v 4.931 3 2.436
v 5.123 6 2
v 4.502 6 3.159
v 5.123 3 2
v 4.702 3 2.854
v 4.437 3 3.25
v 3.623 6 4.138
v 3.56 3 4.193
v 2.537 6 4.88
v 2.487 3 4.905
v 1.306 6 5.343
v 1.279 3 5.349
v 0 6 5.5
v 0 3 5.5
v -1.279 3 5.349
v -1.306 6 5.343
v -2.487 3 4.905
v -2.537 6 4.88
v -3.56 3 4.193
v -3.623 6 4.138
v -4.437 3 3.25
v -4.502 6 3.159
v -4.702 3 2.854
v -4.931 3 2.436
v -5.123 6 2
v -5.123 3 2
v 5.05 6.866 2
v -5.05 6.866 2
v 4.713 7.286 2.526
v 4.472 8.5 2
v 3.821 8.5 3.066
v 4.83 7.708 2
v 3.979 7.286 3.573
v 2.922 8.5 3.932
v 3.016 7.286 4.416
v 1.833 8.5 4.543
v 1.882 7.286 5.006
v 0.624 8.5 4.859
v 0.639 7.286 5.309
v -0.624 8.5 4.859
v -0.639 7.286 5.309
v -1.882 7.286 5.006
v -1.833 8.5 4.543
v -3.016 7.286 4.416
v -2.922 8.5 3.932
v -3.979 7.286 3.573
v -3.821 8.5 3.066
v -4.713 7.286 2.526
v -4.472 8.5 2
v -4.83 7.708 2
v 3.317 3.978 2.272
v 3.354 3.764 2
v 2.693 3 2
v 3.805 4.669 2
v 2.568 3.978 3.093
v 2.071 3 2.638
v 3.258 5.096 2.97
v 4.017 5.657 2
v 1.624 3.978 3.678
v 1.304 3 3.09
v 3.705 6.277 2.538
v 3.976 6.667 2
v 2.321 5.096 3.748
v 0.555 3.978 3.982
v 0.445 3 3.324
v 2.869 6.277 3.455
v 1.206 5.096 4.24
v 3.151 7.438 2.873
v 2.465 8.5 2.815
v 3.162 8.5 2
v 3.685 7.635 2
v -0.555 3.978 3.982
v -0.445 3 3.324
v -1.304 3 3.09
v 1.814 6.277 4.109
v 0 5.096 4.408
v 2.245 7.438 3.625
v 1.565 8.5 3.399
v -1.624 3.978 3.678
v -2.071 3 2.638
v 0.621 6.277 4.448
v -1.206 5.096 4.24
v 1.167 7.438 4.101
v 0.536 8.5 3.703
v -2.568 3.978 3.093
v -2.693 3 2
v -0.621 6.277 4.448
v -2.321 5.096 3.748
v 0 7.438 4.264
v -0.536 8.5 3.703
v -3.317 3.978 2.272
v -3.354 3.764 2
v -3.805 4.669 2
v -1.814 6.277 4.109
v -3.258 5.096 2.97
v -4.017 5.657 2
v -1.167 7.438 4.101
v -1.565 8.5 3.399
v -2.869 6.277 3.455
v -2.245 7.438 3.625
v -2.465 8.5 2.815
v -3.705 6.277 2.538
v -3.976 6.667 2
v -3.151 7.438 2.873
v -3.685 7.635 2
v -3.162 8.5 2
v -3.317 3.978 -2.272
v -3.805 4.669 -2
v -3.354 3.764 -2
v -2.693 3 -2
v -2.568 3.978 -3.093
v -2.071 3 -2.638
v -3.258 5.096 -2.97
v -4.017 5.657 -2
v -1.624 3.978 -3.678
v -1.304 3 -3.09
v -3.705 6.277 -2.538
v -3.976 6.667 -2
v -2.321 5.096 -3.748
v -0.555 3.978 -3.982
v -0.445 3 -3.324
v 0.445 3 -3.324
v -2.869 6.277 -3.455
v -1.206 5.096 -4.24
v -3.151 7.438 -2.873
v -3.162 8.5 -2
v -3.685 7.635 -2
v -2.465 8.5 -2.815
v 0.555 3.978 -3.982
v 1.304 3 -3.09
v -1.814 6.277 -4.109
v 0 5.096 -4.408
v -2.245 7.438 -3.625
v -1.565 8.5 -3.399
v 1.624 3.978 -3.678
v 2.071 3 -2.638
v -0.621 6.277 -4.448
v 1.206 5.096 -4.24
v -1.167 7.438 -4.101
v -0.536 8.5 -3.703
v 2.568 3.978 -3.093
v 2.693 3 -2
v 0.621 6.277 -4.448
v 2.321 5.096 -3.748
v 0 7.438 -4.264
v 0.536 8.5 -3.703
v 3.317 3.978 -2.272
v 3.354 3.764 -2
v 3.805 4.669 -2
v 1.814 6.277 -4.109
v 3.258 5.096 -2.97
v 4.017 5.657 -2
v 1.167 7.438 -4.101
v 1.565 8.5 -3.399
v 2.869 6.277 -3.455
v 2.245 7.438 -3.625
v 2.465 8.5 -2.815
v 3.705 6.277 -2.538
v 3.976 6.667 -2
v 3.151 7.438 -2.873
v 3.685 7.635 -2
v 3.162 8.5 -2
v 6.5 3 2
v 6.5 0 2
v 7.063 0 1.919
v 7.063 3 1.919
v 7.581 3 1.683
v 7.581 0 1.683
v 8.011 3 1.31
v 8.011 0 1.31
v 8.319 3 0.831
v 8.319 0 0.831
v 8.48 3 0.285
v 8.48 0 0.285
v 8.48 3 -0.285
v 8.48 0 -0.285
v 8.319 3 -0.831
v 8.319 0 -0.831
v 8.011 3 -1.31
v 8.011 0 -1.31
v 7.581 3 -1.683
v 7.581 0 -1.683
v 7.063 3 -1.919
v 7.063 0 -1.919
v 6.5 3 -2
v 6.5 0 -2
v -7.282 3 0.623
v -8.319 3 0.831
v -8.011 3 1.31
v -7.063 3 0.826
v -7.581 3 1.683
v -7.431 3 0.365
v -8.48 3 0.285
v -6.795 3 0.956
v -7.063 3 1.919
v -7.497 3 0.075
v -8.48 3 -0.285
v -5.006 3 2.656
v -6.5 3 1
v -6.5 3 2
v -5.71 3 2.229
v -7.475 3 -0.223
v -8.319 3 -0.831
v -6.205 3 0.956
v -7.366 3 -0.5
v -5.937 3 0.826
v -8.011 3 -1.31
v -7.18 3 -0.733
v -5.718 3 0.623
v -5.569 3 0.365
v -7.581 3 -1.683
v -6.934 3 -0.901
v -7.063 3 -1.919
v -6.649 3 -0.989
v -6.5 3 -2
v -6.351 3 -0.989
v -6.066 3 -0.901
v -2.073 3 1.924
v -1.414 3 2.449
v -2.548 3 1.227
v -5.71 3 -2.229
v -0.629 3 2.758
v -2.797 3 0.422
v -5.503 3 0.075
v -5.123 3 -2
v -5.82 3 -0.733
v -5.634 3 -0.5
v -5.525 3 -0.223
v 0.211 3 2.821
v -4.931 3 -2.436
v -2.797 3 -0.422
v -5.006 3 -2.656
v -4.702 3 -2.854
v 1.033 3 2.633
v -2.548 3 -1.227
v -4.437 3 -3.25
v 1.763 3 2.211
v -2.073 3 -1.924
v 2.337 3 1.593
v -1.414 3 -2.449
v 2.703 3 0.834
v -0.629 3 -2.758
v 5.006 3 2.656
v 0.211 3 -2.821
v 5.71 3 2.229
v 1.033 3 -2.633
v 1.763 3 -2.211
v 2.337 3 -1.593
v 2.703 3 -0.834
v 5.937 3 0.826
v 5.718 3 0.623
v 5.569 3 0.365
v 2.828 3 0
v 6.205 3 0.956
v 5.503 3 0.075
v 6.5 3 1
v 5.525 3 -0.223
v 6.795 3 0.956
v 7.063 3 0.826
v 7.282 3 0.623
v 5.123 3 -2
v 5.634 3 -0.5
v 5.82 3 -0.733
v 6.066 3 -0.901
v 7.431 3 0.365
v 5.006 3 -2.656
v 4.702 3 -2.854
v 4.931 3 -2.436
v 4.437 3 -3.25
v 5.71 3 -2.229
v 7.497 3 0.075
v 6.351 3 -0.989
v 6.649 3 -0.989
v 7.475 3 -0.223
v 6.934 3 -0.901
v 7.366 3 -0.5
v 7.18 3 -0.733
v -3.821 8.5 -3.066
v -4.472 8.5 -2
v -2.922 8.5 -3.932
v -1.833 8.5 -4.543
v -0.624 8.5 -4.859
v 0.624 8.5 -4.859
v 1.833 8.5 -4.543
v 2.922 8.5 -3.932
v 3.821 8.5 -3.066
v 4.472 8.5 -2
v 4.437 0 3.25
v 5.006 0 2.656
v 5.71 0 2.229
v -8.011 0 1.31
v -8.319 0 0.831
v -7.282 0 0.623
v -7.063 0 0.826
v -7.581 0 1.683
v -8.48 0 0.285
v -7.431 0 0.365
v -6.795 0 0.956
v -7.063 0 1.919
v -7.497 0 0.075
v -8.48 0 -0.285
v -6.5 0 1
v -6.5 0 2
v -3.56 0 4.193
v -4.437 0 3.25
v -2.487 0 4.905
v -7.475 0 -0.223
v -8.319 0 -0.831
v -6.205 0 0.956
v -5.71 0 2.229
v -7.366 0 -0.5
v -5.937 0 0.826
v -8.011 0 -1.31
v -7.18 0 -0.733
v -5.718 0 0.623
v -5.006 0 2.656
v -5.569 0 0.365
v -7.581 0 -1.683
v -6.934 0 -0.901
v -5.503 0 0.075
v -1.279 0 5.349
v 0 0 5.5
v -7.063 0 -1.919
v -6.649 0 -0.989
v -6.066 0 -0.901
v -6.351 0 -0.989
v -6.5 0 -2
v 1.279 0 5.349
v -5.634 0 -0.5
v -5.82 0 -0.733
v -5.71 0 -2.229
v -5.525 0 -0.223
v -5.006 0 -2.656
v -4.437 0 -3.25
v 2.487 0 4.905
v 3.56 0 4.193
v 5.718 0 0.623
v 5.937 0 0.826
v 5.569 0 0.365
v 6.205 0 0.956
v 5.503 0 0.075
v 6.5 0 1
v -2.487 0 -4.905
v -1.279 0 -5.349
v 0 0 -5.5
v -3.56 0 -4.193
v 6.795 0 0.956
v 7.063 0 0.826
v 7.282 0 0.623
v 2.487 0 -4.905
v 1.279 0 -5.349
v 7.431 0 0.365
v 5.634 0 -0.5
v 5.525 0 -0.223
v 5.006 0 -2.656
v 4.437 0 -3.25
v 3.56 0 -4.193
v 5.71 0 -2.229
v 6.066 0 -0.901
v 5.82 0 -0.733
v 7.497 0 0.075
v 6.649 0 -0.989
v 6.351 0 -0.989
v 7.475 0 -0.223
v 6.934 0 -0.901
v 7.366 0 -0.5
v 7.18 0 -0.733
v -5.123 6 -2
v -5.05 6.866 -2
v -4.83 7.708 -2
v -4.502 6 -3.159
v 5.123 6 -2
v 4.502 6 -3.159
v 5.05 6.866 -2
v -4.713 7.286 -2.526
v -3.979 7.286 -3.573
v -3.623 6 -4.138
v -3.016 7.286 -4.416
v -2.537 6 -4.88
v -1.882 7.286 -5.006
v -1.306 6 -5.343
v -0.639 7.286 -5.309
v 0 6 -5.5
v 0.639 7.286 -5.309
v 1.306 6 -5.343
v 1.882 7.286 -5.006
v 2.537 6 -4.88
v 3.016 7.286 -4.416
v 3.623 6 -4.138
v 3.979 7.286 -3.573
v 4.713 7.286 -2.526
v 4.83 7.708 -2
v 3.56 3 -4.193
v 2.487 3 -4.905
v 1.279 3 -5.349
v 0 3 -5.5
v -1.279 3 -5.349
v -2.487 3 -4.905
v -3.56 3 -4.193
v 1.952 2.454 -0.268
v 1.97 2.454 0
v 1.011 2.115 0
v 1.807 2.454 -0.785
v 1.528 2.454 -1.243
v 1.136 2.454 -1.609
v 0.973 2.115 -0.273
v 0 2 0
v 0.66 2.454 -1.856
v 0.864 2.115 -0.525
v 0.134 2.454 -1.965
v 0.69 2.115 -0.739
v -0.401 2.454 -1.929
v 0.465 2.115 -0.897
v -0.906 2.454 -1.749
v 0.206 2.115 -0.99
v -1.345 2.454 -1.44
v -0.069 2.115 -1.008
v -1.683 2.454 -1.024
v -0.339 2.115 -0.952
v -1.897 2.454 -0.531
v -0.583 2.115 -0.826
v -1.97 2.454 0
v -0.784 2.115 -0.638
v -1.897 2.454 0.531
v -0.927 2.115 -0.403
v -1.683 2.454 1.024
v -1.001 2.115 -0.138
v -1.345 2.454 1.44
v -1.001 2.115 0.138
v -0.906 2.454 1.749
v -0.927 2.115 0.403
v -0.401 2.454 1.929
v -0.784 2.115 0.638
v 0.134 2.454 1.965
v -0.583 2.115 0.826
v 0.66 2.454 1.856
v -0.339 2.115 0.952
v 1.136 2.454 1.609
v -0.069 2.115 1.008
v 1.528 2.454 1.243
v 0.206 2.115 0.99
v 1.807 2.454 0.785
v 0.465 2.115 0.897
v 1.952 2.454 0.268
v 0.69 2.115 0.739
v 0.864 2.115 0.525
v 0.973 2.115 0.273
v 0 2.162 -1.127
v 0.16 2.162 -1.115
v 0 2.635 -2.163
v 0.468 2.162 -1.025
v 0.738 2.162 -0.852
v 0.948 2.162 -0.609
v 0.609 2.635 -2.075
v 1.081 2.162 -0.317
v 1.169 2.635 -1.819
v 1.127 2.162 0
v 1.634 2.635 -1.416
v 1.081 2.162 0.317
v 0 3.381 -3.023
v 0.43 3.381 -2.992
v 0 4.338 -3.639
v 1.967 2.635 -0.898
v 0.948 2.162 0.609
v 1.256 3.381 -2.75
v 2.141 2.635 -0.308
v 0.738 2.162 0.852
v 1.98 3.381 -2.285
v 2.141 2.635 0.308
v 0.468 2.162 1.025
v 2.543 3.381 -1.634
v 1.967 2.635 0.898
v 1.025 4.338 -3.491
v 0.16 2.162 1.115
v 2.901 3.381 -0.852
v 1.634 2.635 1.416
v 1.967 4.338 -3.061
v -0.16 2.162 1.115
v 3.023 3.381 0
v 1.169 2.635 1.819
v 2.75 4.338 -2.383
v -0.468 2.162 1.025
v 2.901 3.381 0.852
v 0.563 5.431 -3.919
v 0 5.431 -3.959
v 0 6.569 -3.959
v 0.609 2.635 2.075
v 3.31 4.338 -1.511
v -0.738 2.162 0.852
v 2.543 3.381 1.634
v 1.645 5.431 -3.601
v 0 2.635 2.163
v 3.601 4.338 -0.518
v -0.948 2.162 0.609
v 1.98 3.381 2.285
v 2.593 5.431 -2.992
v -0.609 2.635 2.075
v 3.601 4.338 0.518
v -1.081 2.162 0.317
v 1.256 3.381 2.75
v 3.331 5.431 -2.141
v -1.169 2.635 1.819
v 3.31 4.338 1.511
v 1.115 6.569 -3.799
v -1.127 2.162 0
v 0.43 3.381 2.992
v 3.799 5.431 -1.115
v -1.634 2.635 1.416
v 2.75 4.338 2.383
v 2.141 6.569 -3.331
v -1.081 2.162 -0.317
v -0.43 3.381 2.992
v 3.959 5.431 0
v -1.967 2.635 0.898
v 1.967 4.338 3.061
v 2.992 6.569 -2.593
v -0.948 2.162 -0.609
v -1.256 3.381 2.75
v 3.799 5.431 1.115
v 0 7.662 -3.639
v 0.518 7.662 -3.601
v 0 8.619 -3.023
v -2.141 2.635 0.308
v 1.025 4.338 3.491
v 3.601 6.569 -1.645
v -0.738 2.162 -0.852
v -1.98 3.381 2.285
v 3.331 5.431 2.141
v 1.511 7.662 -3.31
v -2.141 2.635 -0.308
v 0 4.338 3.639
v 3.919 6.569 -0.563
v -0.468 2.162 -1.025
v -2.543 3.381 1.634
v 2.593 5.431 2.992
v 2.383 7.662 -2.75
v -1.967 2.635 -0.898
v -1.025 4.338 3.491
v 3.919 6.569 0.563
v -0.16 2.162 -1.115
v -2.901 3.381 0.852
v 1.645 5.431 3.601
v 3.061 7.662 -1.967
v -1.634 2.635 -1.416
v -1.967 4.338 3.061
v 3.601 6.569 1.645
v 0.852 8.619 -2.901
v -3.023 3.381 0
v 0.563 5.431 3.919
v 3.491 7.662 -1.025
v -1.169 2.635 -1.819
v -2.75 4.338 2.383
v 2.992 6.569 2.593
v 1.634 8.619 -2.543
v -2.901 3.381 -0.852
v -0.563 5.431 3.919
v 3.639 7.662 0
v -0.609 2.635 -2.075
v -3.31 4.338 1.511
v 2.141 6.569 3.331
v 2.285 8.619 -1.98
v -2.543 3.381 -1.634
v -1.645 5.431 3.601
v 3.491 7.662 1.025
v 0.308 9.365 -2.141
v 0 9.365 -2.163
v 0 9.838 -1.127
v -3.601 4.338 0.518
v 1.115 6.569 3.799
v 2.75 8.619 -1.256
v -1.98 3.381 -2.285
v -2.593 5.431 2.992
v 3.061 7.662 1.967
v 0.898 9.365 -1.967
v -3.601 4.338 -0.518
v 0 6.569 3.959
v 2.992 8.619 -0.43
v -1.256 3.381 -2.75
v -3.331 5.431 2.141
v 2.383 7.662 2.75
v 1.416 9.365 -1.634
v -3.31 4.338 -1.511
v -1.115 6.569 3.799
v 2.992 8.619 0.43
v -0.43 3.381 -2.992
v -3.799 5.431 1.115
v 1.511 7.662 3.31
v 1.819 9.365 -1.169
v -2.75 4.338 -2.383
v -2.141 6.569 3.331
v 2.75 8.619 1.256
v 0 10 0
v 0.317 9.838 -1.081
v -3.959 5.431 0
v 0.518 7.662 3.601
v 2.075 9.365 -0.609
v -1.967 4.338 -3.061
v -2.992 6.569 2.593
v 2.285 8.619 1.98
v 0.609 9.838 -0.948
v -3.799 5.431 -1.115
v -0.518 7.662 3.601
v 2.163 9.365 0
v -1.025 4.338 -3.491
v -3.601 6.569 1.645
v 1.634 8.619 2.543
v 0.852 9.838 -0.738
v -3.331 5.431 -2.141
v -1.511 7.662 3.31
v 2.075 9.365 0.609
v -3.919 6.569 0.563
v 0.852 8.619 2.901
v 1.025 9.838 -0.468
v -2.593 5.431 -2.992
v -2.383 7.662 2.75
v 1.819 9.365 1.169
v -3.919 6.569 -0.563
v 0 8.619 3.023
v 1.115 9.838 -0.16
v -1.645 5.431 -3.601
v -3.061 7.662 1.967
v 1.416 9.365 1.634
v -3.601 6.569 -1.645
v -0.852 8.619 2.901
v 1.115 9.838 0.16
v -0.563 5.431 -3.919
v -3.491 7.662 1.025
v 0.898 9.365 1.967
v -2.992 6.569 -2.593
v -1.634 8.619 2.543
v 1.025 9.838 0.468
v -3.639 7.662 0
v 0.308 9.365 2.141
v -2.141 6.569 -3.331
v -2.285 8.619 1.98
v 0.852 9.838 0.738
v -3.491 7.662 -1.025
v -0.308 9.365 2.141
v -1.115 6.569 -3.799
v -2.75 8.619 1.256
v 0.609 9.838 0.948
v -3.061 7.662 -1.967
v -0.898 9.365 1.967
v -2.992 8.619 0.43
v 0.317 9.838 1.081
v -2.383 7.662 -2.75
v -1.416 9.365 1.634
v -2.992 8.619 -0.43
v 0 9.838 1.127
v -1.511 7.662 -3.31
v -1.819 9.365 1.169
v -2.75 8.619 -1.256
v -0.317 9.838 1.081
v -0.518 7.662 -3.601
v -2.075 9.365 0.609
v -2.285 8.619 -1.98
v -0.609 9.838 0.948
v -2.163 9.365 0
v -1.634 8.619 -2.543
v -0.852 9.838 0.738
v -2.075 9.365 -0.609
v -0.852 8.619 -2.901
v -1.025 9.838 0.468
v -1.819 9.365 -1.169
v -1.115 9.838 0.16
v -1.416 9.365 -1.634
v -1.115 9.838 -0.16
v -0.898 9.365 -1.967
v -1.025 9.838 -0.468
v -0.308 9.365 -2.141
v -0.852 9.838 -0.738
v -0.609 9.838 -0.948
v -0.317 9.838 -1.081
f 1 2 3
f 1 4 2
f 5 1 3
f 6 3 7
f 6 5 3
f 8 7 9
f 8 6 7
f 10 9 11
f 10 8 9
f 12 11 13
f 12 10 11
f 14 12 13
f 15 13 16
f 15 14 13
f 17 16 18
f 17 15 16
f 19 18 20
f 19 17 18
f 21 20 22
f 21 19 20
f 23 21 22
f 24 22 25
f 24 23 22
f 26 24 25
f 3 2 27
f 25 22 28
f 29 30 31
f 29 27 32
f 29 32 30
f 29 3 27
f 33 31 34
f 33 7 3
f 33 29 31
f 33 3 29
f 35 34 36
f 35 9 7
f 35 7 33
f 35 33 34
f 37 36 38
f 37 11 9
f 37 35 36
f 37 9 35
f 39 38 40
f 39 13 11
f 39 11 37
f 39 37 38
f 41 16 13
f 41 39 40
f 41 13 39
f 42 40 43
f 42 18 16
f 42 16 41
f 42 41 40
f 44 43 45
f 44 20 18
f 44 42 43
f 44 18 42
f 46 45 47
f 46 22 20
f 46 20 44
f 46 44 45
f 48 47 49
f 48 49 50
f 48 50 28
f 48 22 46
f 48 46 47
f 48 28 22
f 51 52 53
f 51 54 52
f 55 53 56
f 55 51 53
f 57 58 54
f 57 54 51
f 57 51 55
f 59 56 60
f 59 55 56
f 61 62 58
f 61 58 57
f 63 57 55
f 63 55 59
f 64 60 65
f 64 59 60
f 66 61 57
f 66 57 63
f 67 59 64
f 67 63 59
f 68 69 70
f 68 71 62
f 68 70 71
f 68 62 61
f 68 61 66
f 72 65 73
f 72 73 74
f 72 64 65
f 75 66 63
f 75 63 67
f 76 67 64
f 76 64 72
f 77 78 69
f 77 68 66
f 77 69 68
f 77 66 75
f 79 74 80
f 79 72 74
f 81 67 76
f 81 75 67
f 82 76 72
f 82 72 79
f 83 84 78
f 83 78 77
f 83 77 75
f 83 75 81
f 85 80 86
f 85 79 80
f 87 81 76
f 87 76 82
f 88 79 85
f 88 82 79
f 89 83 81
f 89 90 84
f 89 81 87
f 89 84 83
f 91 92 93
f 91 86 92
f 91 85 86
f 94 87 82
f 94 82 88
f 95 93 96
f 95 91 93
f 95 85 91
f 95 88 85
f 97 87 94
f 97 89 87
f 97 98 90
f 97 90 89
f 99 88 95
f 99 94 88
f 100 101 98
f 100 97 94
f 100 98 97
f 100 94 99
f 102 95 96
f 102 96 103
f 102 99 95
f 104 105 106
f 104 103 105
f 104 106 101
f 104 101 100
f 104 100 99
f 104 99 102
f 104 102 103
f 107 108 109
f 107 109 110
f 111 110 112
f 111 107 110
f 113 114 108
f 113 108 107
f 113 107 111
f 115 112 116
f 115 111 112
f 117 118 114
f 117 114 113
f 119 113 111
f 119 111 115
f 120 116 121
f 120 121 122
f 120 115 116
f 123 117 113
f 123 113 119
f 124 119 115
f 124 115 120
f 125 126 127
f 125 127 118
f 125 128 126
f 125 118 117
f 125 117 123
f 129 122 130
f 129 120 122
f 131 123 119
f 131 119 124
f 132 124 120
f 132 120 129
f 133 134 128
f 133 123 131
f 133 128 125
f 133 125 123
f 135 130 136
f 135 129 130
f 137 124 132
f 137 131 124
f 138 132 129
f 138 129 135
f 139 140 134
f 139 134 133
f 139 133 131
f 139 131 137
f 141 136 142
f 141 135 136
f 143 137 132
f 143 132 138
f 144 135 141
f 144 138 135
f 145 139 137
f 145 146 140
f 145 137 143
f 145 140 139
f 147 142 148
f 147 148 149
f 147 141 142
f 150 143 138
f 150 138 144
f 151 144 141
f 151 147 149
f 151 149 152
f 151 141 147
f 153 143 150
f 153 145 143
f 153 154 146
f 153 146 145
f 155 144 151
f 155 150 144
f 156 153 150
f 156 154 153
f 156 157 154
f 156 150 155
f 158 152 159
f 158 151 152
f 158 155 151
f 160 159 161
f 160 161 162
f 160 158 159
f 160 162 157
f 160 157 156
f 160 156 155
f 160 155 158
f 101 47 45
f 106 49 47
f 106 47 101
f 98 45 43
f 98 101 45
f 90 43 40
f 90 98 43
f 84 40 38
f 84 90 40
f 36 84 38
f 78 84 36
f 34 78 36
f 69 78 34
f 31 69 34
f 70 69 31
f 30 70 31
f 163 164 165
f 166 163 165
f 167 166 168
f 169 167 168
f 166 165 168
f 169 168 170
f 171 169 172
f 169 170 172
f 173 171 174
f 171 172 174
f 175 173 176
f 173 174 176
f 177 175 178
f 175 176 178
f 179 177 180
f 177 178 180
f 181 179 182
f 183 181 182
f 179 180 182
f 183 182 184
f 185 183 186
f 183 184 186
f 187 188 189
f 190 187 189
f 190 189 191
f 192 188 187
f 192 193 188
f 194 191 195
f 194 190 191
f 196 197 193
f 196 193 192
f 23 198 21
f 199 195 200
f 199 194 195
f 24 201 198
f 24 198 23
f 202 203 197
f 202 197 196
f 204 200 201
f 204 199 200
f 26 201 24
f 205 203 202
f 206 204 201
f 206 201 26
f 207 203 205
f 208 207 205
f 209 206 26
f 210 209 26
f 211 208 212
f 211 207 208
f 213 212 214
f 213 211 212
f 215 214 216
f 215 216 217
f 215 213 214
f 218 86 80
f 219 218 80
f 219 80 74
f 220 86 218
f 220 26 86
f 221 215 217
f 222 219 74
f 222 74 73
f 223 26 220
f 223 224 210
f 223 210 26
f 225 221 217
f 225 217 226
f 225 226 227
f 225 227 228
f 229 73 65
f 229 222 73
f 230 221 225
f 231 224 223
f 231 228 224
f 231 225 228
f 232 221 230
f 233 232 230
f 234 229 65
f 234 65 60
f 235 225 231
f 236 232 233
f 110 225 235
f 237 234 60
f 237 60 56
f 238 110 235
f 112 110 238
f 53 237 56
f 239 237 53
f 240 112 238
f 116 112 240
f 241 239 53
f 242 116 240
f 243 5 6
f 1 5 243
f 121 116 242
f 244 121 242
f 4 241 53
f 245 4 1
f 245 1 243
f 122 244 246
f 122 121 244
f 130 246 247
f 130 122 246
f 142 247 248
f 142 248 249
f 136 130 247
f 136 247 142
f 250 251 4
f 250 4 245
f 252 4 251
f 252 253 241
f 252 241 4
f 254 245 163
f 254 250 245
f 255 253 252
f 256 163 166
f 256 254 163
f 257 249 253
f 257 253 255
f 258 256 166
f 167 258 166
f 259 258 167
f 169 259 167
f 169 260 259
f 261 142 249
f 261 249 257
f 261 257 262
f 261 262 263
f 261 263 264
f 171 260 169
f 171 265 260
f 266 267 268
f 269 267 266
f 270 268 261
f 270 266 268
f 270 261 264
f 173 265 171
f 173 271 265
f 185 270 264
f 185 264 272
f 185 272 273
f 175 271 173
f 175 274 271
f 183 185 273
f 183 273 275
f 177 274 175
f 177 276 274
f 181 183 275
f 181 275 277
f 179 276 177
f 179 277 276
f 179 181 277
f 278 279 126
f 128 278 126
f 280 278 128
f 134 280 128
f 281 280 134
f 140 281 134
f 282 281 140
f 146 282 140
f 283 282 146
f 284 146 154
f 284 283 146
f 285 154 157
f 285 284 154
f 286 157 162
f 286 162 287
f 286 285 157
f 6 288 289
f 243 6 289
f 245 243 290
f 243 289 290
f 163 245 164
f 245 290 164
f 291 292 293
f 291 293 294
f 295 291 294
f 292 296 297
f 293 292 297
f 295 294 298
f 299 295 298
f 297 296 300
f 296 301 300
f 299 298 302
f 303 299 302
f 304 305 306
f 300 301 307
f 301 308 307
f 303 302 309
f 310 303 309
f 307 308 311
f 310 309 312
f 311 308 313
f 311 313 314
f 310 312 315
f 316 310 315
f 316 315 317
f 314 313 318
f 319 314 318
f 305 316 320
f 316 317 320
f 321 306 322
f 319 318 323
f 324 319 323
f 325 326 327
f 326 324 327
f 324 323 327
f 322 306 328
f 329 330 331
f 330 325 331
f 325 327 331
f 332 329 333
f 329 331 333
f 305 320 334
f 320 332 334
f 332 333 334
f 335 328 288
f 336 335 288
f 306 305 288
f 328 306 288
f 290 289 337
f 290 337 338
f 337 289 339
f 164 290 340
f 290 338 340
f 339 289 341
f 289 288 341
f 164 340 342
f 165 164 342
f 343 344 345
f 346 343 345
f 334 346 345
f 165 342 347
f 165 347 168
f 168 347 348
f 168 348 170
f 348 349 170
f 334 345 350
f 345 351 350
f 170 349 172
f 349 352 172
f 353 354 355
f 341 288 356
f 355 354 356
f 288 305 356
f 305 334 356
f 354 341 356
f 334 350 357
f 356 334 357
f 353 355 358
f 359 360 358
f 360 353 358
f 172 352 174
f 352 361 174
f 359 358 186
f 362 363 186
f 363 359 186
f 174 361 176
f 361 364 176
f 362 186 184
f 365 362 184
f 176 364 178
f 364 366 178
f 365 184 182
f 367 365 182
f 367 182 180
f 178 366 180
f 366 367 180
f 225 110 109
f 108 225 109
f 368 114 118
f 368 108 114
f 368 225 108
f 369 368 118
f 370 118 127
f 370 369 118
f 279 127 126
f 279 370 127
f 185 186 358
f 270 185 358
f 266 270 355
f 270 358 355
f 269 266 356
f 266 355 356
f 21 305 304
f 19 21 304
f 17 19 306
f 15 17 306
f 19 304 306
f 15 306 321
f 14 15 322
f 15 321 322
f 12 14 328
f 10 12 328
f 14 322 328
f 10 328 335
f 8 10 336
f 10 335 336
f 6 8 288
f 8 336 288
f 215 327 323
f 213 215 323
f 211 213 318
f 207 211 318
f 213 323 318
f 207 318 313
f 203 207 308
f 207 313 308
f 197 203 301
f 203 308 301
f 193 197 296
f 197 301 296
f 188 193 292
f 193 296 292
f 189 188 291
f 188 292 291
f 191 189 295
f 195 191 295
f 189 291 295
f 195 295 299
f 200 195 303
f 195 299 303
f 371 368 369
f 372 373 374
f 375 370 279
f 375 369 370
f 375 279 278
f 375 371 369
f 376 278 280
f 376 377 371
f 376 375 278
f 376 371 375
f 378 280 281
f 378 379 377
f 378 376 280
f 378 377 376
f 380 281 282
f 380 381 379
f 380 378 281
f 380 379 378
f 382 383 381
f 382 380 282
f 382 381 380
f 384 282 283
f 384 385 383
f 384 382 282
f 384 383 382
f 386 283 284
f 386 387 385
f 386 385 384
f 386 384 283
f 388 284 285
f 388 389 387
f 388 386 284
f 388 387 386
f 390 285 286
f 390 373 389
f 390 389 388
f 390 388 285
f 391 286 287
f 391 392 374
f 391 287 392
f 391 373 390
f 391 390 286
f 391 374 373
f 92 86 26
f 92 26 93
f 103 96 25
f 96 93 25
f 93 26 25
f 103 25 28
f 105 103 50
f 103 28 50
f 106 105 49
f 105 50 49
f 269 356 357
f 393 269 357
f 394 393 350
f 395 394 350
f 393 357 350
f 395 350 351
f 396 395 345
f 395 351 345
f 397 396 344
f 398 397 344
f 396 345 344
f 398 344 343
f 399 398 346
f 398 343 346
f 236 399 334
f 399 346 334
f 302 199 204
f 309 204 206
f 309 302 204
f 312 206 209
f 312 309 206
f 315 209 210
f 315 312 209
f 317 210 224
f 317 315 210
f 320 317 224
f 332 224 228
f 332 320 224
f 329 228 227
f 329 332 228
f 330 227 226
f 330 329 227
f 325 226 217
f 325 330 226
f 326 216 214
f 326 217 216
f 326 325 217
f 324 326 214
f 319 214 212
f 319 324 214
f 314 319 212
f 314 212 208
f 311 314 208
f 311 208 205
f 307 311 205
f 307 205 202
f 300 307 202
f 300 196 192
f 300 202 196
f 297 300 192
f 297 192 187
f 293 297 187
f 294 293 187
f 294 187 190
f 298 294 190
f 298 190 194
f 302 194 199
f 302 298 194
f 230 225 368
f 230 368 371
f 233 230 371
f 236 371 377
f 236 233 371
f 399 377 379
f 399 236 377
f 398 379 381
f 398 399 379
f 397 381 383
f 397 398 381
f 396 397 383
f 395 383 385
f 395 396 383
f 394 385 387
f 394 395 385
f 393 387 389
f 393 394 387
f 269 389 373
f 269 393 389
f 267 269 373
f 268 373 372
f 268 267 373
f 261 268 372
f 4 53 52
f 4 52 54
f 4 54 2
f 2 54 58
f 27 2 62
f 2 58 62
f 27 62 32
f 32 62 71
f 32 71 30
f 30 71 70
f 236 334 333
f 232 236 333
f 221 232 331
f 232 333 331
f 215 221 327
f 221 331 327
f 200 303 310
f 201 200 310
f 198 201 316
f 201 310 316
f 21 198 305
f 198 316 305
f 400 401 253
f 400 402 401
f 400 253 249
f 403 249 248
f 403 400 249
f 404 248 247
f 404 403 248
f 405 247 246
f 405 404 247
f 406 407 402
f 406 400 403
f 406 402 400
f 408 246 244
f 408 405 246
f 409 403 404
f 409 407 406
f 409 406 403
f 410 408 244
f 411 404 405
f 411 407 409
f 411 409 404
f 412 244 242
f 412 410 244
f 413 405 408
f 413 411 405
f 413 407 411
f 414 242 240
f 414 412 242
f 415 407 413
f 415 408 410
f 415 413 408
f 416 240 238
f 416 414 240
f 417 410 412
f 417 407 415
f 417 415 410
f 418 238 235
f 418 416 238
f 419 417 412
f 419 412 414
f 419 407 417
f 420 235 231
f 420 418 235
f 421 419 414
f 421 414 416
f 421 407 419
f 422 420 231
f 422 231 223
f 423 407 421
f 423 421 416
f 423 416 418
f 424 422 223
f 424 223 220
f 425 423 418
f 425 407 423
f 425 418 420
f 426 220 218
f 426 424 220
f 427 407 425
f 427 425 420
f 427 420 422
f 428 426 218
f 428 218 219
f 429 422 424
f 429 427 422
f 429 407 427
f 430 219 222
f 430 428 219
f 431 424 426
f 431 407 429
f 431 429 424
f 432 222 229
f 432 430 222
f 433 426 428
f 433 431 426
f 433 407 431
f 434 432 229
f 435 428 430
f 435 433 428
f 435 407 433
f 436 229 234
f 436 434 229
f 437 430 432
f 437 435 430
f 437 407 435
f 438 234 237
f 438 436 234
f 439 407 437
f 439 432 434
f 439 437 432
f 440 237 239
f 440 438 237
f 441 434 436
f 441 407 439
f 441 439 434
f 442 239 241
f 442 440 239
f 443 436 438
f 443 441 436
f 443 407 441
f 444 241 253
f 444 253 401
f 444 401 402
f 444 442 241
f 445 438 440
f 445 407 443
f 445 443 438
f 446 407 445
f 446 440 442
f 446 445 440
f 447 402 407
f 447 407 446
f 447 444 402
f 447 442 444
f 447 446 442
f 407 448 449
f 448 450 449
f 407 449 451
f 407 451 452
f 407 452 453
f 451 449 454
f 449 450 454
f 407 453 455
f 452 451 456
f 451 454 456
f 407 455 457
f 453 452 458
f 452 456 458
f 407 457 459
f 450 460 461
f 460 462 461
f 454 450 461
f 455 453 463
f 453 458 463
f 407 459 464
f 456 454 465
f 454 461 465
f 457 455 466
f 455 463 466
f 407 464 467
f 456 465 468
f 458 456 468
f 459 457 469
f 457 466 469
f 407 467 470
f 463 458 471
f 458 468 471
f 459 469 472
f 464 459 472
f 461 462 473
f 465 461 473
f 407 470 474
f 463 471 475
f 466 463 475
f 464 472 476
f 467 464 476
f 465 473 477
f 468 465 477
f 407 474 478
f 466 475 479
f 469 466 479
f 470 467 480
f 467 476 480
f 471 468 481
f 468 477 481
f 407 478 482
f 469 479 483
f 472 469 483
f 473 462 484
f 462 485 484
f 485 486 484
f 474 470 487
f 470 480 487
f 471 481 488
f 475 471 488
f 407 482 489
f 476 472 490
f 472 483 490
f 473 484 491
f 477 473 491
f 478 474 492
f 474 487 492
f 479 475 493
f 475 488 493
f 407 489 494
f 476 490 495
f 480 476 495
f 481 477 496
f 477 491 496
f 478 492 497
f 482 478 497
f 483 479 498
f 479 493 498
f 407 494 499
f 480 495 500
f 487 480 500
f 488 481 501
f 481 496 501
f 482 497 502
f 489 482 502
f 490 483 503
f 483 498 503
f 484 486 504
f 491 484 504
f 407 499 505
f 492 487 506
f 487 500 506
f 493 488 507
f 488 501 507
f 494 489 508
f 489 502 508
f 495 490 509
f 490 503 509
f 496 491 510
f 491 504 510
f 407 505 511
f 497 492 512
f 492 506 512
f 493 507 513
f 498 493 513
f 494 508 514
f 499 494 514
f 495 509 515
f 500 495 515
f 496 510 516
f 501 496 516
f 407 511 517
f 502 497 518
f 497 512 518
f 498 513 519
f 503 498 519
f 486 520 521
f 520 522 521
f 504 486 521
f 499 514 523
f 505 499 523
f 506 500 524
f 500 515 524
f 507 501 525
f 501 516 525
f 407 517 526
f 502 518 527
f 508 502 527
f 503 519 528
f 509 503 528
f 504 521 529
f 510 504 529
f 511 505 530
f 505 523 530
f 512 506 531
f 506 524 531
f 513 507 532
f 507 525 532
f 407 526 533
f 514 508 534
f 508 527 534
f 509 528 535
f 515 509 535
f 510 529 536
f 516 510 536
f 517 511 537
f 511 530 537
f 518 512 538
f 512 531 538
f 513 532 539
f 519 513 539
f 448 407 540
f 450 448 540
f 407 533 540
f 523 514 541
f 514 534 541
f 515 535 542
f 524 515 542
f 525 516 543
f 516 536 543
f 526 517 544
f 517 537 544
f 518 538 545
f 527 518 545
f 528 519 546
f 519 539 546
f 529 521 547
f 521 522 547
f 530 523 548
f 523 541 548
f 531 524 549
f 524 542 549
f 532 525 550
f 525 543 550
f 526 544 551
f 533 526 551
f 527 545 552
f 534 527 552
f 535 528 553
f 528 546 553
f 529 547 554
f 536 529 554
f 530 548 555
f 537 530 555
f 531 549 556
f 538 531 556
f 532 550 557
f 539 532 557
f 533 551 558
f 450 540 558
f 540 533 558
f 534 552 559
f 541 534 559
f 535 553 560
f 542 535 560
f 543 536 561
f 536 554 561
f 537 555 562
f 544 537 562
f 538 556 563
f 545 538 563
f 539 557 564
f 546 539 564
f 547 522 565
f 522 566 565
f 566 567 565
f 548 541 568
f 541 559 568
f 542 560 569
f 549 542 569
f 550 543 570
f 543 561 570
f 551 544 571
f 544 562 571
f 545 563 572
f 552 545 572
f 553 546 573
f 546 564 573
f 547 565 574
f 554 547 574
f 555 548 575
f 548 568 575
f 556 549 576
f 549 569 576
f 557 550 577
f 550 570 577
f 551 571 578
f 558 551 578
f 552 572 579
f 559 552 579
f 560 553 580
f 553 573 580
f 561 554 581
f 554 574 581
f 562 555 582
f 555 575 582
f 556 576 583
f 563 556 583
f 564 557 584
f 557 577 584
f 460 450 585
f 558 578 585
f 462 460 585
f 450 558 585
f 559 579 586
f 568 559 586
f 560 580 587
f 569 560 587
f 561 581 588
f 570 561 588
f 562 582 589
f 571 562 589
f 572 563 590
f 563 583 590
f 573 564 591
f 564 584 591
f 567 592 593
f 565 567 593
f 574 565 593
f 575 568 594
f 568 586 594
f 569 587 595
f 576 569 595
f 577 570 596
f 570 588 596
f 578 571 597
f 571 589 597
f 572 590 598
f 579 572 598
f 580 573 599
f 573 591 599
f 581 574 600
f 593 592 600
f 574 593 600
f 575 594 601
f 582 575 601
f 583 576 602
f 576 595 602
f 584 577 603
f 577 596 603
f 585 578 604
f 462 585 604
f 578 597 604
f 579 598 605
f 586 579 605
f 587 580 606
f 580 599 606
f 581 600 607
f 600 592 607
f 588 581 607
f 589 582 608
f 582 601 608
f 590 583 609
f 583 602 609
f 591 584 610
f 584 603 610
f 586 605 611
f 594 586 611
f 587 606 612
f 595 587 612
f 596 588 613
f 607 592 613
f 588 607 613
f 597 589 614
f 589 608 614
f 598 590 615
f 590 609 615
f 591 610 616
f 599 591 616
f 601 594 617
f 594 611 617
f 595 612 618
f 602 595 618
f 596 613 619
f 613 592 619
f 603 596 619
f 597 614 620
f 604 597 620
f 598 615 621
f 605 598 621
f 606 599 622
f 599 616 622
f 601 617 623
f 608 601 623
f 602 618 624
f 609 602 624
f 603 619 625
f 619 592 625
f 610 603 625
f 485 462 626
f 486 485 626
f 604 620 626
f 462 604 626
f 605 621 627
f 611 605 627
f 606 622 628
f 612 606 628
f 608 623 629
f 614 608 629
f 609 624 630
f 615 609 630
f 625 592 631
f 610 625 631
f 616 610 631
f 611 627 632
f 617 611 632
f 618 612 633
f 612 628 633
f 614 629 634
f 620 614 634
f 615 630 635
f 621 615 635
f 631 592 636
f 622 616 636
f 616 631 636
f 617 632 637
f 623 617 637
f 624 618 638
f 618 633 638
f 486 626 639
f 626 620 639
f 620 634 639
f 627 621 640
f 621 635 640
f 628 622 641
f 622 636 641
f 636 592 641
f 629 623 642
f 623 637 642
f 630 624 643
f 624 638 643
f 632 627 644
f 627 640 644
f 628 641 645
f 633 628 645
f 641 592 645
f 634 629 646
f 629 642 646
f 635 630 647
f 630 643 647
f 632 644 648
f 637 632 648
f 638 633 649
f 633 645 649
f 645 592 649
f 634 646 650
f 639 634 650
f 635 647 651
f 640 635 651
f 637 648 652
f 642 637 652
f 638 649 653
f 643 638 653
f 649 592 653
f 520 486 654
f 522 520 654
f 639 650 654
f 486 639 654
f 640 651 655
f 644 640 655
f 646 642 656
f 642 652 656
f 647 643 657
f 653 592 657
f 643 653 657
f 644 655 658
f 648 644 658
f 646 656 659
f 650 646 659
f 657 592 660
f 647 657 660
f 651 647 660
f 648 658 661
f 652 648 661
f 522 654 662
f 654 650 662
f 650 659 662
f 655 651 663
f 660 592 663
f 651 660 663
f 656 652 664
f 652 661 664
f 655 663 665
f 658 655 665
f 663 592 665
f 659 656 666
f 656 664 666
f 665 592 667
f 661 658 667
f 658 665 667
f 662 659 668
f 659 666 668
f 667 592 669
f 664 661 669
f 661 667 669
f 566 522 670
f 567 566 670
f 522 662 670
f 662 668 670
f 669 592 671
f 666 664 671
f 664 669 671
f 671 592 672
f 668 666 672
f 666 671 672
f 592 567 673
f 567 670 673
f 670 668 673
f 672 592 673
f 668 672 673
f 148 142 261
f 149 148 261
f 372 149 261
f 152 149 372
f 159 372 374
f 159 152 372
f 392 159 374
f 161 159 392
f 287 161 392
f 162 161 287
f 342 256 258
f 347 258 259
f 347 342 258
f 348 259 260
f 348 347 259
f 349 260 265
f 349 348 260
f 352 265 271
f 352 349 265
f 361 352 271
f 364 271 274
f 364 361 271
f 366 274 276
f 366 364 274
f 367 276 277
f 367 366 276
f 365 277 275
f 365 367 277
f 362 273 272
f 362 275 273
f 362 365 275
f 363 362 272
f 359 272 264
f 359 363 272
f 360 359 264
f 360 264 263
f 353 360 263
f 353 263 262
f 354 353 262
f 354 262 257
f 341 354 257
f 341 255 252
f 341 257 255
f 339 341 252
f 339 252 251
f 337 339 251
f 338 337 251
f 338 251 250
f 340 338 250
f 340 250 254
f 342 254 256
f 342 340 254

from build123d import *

# Parameters (mm, degrees)
SKETCH1_R               = 1
BOSS_EXTRUDE1_DEPTH     = 3
CUT_EXTRUDE2_DEPTH      = 14.219304066
CUT_EXTRUDE2_DEPTH_BACK = 14.219304066
SKETCH20_W              = 4
SKETCH20_H              = 5.5


with BuildPart() as part:
    # Sketch1 → Boss-Extrude1 (new body)
    with BuildSketch(Plane(origin=(0, 0, 0), x_dir=(1, 0, 0), z_dir=(0, 1, 0))):
        with BuildLine():
            ThreePointArc((-4.437059837, -3.25), (0, -5.5), (4.437059837, -3.25))
            ThreePointArc((4.437059837, -3.25), (5.343838437, -2.419215147), (6.5, -2))
            ThreePointArc((6.5, -2), (8.5, 0), (6.5, 2))
            ThreePointArc((6.5, 2), (5.343838437, 2.419215147), (4.437059837, 3.25))
            ThreePointArc((4.437059837, 3.25), (0, 5.5), (-4.437059837, 3.25))
            ThreePointArc((-4.437059837, 3.25), (-5.343838437, 2.419215147), (-6.5, 2))
            ThreePointArc((-6.5, 2), (-8.5, 0), (-6.5, -2))
            ThreePointArc((-6.5, -2), (-5.343838437, -2.419215147), (-4.437059837, -3.25))
        make_face()
        with Locations(Location((-6.5, 0, 0), (0, 0, 270))):
            Circle(SKETCH1_R, mode=Mode.SUBTRACT)
        with Locations(Location((6.5, 0, 0), (0, 0, 270))):
            Circle(SKETCH1_R, mode=Mode.SUBTRACT)
    extrude(amount=BOSS_EXTRUDE1_DEPTH)

    # Sketch10 → Cut-Revolve2 (revolve, cut)
    with BuildSketch(Plane.XY):
        with BuildLine():
            Line((0, 2), (0, 11))
            ThreePointArc((0, 11), (4.5, 6.5), (0, 2))
        make_face()
    revolve(axis=Axis((0, 2, 0), (0, 1, 0)), mode=Mode.SUBTRACT)

    # Sketch19 → Revolve6 (revolve)
    with BuildSketch(Plane(origin=(0, 0, 0), x_dir=(0, 0, -1), z_dir=(1, 0, 0)), mode=Mode.PRIVATE) as revolve6_sk:
        with BuildLine():
            Line((5.5, 6), (5.5, 3))
            Line((5.5, 3), (3.354101966, 3))
            ThreePointArc((3.354101966, 3), (4.48886959, 5.683693501), (3.741657387, 8.5))
            Line((3.741657387, 8.5), (4.898979486, 8.5))
            ThreePointArc((4.898979486, 8.5), (5.347634392, 7.285615189), (5.5, 6))
        make_face()
    revolve(revolve6_sk.sketch.rotate(Axis((0, 10, 0), (0, -1, 0)), 270), axis=Axis((0, 10, 0), (0, -1, 0)))

    # Sketch20 → Cut-Extrude2 (cut, two sides: drawn at the far end of the back side and taken through both)
    with BuildSketch(Plane(origin=(0, 0, 0), x_dir=(0, 0, -1), z_dir=(1, 0, 0)).offset(-CUT_EXTRUDE2_DEPTH_BACK)):
        with Locations((0, 5.75)):
            Rectangle(SKETCH20_W, SKETCH20_H)
    extrude(amount=CUT_EXTRUDE2_DEPTH + CUT_EXTRUDE2_DEPTH_BACK, mode=Mode.SUBTRACT)


with BuildPart() as body_2:
    # Sketch18 → Revolve7 (revolve)
    with BuildSketch(Plane(origin=(0, 0, 0), x_dir=(0, 0, -1), z_dir=(1, 0, 0))):
        with BuildLine():
            Line((0, 10), (0, 2))
            ThreePointArc((0, 2), (4, 6), (0, 10))
        make_face()
    revolve(axis=Axis((0, 10, 0), (0, -1, 0)))


solid = Compound([part.part, body_2.part])
